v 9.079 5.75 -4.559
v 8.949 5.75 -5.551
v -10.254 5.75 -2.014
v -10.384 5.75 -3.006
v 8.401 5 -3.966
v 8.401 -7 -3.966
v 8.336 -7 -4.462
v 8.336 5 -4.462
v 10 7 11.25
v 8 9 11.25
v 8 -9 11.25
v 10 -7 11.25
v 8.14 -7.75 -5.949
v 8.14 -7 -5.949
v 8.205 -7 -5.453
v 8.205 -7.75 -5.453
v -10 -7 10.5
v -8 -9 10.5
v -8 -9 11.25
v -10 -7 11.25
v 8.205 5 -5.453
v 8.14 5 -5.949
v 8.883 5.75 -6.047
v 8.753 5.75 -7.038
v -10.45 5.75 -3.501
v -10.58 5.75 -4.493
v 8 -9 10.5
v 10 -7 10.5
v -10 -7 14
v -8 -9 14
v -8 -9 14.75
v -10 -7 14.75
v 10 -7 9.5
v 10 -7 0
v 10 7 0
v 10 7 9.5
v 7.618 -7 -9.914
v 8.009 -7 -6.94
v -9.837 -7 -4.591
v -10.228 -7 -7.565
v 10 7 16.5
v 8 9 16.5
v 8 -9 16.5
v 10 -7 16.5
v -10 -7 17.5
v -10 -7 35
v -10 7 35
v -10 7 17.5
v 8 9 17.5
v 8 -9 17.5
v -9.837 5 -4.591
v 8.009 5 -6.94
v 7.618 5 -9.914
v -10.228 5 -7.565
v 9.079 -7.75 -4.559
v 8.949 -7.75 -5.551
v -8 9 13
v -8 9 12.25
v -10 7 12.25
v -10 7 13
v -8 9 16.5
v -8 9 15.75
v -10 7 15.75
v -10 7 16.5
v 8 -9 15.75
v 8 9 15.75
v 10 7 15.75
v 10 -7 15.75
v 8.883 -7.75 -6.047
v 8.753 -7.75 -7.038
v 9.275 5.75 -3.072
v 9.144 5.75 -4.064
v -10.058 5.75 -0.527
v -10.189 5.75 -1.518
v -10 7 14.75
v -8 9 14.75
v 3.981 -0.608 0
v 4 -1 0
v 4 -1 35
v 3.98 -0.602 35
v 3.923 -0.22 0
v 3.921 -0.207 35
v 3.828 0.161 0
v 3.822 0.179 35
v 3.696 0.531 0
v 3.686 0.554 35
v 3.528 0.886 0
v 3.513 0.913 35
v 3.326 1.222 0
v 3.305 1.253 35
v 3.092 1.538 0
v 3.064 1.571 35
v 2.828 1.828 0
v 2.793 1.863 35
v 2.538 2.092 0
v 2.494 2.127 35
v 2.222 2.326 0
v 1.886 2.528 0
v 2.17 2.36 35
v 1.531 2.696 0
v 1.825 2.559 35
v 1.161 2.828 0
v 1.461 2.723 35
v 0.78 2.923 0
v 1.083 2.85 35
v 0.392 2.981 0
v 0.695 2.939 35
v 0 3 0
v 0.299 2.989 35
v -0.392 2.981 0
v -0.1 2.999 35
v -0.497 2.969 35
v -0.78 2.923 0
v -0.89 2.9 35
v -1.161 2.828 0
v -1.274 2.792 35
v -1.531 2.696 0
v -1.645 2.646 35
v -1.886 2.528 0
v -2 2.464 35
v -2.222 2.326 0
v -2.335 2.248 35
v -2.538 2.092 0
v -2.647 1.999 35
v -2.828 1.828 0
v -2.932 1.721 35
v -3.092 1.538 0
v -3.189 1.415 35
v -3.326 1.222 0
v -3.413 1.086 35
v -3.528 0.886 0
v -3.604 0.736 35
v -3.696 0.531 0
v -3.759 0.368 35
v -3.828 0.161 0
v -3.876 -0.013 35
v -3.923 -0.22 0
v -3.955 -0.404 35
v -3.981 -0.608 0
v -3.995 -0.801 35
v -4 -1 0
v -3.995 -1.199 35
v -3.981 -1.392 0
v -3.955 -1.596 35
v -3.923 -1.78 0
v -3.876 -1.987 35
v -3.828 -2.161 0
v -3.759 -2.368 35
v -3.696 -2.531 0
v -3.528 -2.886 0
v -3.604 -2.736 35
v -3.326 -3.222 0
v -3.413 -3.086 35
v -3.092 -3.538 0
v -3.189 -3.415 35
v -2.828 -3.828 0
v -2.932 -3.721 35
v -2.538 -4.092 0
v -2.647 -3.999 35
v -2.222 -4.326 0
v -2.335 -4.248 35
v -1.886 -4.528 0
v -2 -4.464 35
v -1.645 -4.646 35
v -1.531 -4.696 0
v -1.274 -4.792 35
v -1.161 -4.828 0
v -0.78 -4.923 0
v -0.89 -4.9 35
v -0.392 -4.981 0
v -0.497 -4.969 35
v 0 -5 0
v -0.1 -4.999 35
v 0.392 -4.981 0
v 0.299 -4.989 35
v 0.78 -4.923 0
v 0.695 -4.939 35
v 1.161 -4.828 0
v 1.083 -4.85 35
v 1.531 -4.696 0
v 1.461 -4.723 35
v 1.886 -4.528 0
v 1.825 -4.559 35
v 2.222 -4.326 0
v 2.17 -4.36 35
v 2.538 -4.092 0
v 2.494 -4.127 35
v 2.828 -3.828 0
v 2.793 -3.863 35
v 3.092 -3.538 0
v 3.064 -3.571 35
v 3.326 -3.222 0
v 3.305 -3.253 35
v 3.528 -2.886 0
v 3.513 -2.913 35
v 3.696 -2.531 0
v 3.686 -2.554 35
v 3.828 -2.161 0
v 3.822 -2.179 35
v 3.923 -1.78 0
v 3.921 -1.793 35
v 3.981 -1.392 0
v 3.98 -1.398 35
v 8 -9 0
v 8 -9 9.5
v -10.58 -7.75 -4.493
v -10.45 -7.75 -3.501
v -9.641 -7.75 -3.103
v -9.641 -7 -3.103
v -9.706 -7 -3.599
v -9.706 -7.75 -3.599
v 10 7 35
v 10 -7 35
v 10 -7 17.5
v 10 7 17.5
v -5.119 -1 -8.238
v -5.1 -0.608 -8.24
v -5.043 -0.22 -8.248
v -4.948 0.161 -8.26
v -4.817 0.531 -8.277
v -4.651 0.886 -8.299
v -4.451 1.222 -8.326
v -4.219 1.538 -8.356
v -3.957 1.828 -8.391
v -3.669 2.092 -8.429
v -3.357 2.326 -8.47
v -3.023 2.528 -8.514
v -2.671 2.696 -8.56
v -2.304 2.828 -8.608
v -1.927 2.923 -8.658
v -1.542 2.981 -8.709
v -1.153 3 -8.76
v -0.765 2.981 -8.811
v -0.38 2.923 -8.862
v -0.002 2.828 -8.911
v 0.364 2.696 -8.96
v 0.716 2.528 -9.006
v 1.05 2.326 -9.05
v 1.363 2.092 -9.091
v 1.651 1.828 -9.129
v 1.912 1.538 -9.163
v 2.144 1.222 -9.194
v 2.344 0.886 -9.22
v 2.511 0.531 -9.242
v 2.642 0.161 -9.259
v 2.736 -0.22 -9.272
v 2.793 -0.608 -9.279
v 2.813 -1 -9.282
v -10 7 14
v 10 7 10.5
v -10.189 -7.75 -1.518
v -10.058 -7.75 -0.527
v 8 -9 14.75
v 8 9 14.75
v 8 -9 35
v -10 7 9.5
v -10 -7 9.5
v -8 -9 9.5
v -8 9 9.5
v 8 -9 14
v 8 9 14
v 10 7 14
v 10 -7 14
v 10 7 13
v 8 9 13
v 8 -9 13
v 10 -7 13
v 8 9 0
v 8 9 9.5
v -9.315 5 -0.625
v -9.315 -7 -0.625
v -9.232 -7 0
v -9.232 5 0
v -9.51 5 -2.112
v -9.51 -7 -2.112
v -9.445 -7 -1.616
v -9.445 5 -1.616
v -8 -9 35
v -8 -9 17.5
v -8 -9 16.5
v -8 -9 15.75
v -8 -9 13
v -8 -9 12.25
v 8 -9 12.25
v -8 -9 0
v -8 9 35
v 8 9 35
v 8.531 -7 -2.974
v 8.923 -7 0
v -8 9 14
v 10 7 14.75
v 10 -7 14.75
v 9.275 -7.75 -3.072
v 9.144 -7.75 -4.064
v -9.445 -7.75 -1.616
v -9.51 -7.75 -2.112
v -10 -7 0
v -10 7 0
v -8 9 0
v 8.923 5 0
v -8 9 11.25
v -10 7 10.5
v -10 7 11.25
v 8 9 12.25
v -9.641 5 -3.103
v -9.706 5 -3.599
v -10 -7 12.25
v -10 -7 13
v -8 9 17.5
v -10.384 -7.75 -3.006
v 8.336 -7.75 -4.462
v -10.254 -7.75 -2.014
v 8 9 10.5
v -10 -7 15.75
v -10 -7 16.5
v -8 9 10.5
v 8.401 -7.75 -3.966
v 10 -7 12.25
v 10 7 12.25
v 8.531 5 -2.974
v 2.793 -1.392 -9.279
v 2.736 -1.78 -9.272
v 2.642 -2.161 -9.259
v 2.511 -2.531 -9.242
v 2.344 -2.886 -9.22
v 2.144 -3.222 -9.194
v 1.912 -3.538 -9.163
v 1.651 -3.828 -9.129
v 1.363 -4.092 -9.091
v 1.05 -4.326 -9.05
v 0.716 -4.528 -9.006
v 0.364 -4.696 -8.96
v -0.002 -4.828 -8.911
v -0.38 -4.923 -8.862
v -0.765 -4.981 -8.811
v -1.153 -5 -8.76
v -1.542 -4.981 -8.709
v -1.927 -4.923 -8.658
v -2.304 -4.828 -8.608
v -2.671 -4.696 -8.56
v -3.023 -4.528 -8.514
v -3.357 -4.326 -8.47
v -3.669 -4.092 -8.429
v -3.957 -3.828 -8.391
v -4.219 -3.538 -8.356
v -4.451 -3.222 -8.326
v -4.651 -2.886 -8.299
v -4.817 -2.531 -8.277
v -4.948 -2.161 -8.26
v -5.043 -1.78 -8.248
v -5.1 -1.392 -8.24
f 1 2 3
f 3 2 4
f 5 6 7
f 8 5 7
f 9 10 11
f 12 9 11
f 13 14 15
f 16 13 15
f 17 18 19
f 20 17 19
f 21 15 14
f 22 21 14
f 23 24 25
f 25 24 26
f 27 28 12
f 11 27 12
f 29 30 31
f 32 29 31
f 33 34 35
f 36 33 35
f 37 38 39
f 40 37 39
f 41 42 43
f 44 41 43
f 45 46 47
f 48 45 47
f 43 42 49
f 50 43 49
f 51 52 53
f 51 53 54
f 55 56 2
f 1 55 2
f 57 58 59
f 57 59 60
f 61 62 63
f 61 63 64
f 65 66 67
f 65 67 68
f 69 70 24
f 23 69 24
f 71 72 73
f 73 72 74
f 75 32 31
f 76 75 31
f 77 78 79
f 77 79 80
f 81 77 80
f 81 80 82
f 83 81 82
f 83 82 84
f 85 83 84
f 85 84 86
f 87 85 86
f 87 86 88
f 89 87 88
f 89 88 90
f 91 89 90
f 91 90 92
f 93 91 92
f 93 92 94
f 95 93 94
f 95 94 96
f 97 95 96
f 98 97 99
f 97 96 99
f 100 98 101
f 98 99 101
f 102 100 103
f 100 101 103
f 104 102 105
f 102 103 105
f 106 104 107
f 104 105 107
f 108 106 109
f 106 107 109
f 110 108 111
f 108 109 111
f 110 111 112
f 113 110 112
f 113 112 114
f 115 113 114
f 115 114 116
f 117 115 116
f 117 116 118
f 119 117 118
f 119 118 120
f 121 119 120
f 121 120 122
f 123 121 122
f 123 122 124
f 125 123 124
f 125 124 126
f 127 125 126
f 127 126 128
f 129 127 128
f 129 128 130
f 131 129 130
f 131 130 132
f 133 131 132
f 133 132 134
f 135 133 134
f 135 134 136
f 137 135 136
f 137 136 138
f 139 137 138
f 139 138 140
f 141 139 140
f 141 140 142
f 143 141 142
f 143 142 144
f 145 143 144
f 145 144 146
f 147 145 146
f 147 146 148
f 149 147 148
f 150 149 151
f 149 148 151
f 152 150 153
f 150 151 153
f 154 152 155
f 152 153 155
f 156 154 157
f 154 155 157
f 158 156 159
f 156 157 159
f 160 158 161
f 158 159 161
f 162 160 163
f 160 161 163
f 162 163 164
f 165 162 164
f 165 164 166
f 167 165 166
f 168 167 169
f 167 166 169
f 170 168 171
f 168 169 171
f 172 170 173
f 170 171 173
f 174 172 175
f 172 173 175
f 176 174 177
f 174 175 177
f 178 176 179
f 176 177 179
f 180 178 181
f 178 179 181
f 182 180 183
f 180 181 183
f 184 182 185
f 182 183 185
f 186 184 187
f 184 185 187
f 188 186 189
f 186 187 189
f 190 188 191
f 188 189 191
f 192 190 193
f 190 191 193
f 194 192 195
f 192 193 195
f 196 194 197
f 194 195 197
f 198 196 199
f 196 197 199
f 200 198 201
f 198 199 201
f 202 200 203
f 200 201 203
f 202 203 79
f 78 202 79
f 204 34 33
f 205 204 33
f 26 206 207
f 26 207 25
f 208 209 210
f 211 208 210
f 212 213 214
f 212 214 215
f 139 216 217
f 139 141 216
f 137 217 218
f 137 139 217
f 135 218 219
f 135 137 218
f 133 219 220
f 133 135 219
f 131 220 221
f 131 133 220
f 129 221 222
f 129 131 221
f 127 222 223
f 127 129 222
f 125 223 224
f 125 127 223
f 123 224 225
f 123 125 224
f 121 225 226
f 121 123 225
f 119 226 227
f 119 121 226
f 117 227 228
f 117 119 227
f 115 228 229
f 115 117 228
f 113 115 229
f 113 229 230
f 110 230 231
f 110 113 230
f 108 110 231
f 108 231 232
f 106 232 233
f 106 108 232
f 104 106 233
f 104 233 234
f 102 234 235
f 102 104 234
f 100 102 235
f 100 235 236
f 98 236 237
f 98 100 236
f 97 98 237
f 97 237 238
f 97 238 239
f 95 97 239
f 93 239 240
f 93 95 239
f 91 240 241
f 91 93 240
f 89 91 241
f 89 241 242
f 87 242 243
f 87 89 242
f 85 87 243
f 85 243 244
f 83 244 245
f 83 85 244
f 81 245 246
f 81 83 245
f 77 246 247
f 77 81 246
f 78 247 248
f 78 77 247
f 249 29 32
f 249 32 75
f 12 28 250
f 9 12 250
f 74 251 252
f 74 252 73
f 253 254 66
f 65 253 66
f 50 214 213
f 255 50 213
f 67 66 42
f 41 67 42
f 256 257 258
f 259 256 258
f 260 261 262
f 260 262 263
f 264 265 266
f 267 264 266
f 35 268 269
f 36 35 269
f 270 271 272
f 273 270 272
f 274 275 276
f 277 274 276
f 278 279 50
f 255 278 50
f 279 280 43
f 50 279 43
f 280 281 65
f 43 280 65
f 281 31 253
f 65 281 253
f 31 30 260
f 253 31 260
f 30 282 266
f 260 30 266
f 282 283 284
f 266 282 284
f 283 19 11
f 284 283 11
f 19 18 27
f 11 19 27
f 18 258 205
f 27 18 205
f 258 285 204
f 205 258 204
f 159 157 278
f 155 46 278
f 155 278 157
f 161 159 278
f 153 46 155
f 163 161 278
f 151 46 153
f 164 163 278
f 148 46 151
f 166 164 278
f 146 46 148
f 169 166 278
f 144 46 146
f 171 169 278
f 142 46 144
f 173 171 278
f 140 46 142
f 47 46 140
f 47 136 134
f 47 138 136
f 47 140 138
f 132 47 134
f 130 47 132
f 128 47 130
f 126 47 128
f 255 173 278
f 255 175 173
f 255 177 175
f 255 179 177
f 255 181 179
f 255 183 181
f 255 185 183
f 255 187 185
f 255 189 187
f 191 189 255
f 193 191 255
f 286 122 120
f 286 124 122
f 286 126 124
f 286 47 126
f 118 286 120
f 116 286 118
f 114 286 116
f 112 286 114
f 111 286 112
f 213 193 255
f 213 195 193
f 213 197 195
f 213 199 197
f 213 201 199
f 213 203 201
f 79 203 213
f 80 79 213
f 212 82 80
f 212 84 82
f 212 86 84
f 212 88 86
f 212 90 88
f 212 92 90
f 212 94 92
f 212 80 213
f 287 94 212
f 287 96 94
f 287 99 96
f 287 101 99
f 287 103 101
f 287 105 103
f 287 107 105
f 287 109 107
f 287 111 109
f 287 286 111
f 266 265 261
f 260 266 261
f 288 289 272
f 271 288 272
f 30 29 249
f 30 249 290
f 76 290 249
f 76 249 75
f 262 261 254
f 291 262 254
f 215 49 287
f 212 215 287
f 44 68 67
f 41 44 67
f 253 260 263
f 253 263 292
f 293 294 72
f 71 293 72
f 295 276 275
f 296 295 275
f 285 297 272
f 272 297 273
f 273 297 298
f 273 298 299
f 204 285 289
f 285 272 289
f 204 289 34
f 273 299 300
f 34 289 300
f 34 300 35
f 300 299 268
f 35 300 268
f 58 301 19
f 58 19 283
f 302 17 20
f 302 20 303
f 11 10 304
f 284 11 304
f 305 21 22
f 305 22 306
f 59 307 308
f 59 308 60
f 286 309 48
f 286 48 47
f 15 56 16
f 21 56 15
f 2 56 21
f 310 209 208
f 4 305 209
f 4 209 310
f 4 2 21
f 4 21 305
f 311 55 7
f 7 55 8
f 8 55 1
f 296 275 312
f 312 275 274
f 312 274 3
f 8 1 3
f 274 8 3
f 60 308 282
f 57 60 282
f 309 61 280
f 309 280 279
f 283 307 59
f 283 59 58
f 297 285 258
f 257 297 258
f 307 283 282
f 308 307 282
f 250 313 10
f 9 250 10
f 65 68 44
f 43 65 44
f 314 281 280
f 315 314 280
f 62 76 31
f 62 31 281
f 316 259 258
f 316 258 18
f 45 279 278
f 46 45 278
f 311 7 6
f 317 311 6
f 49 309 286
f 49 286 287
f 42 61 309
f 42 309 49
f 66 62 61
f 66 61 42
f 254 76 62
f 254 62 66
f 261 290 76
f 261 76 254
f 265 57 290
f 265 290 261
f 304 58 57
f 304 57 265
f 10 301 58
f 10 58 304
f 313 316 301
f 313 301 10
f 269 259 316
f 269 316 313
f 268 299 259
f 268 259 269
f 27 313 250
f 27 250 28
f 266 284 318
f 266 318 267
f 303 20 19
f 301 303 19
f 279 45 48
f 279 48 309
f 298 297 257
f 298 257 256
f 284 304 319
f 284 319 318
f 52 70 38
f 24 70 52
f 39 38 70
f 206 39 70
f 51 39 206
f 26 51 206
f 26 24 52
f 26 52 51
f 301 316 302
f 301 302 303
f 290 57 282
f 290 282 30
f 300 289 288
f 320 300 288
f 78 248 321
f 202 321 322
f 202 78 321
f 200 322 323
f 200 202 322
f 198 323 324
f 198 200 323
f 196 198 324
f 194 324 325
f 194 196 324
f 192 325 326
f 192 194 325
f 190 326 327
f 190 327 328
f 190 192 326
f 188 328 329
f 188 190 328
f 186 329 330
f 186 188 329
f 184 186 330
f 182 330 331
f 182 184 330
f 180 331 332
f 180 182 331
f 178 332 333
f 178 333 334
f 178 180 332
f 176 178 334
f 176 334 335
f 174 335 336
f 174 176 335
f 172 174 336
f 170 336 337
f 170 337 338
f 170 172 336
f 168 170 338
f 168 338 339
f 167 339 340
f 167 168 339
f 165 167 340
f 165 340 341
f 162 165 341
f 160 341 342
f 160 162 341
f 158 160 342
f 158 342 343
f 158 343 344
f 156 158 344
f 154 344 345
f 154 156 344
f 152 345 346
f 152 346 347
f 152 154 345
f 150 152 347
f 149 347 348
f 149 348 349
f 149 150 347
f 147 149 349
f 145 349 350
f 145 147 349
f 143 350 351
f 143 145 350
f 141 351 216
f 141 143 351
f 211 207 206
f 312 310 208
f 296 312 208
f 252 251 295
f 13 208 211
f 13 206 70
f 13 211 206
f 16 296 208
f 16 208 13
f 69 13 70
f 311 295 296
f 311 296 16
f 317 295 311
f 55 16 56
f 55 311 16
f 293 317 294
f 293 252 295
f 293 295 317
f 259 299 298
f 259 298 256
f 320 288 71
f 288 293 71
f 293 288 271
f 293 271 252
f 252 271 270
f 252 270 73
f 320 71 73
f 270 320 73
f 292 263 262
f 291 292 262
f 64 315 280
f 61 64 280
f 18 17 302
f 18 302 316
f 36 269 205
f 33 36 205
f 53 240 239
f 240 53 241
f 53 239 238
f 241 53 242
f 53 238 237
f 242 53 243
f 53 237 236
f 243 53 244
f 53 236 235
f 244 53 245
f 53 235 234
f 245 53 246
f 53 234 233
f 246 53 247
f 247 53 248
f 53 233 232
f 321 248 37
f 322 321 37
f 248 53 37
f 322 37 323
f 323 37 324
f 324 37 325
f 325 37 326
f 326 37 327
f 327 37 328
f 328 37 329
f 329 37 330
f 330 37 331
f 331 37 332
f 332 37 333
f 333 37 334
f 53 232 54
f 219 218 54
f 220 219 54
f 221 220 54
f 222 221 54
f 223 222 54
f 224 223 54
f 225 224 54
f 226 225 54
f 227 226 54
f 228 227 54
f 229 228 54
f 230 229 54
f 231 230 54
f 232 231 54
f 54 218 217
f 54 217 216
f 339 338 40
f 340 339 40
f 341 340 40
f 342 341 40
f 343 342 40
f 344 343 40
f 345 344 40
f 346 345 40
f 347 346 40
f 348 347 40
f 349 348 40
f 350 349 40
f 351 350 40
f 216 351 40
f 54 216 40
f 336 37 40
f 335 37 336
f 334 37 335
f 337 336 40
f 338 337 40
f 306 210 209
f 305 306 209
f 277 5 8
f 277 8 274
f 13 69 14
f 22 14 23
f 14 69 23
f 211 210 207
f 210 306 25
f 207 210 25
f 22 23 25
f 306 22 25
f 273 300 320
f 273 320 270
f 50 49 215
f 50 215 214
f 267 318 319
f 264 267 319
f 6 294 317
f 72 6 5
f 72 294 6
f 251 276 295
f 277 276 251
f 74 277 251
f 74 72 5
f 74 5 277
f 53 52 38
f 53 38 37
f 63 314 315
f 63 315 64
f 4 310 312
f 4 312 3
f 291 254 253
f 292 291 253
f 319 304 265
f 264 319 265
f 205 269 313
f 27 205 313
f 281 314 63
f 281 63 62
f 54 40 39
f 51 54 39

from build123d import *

# Parameters (mm, degrees)
SKETCH1_W           = 20
SKETCH1_H           = 18
BOSS_EXTRUDE1_DEPTH = 35
CHAMFER1_SIZE       = 2
SKETCH4_W           = 2
SKETCH4_H           = 1
CUT_EXTRUDE2_DEPTH  = 19
BOSS_EXTRUDE3_START = -2
BOSS_EXTRUDE3_DEPTH = 12
SKETCH2_R           = 4
CUT_EXTRUDE1_DEPTH  = 35
SKETCH8_R           = 4
SKETCH9_R           = 4
BOSS_EXTRUDE4_START = -6
SKETCH10_W          = 19.5
SKETCH10_H          = 13.5
SKETCH10_R          = 5
BOSS_EXTRUDE4_DEPTH = 1
LPATTERN1_COUNT     = 3
LPATTERN1_PITCH     = 1.5
BOSS_EXTRUDE5_DEPTH = 0.75


with BuildPart() as part:
    # Sketch1 → Boss-Extrude1 (new body)
    with BuildSketch(Plane.XY):
        Rectangle(SKETCH1_W, SKETCH1_H)
    extrude(amount=BOSS_EXTRUDE1_DEPTH)

    # Chamfer1
    chamfer1_edges = [part.edges().sort_by_distance(p)[0] for p in [
        (10, 9, 17.5),
        (10, -9, 17.5),
        (-10, -9, 17.5),
        (-10, 9, 17.5),
    ]]
    chamfer(chamfer1_edges, length=CHAMFER1_SIZE)

    # Sketch4 → Cut-Extrude2 (cut, through all)
    with BuildSketch(Plane.XZ.offset(9)):
        with Locations((-9, 10)):
            Rectangle(SKETCH4_W, SKETCH4_H)
        with Locations((-9, 11.75)):
            Rectangle(SKETCH4_W, SKETCH4_H)
        with Locations((-9, 13.5)):
            Rectangle(SKETCH4_W, SKETCH4_H)
        with Locations((-9, 15.25)):
            Rectangle(SKETCH4_W, SKETCH4_H)
        with Locations((-9, 17)):
            Rectangle(SKETCH4_W, SKETCH4_H)
        with Locations((9, 17)):
            Rectangle(SKETCH4_W, SKETCH4_H)
        with Locations((9, 15.25)):
            Rectangle(SKETCH4_W, SKETCH4_H)
        with Locations((9, 13.5)):
            Rectangle(SKETCH4_W, SKETCH4_H)
        with Locations((9, 11.75)):
            Rectangle(SKETCH4_W, SKETCH4_H)
        with Locations((9, 10)):
            Rectangle(SKETCH4_W, SKETCH4_H)
    extrude(amount=-CUT_EXTRUDE2_DEPTH, mode=Mode.SUBTRACT)

    # Sketch7 → Boss-Extrude3 (add)
    with BuildSketch(Plane.XZ.offset(9).offset(BOSS_EXTRUDE3_START)):
        Polygon((-8.923003752, 2.34947146), (8.923003752, 0), (7.61774183, -9.914448614), (-10.228265675, -7.564977154), align=None)
    extrude(amount=-BOSS_EXTRUDE3_DEPTH)

    # Sketch2 → Cut-Extrude1 (cut)
    with BuildSketch(Plane.XY.offset(35)):
        with Locations((0, -1)):
            Circle(SKETCH2_R)
    extrude(amount=-CUT_EXTRUDE1_DEPTH, mode=Mode.SUBTRACT)

    # Sketch8 → Cut-Loft1 section 0
    with BuildSketch(Plane(origin=(-1.153239932, 0, -8.759726958), x_dir=(-0.991444861, 0, 0.130526192), z_dir=(-0.130526192, 0, -0.991444861))):
        with Locations((0, -1)):
            Circle(SKETCH8_R)
    # Sketch9 → Cut-Loft1 section 1
    with BuildSketch(Plane.XY):
        with Locations((0, -1)):
            Circle(SKETCH9_R)
    loft(mode=Mode.SUBTRACT)

    # Sketch10 → Boss-Extrude4 (add)
    with BuildSketch(Plane(origin=(-1.153239932, 0, -8.759726958), x_dir=(-0.991444861, 0, 0.130526192), z_dir=(-0.130526192, 0, -0.991444861)).offset(BOSS_EXTRUDE4_START)):
        with Locations((0.153333782, -1)):
            Rectangle(SKETCH10_W, SKETCH10_H)
        with Locations((0, -1)):
            Circle(SKETCH10_R, mode=Mode.SUBTRACT)
    boss_extrude4 = extrude(amount=-BOSS_EXTRUDE4_DEPTH)

    # LPattern1: Boss-Extrude4 ×3
    with Locations(*[Vector(-0.130526192, 0, -0.991444861) * (i * LPATTERN1_PITCH) for i in range(1, LPATTERN1_COUNT)]):
        add(boss_extrude4)

    # Sketch11 → Boss-Extrude5 (add)
    with BuildSketch(Plane.XZ.offset(7)):
        Polygon((-9.706160906, -3.599197708), (8.139846599, -5.948669168), (8.400898983, -3.965779445), (-9.445108521, -1.616307986), align=None)
    extrude(amount=BOSS_EXTRUDE5_DEPTH)


solid = part.part
